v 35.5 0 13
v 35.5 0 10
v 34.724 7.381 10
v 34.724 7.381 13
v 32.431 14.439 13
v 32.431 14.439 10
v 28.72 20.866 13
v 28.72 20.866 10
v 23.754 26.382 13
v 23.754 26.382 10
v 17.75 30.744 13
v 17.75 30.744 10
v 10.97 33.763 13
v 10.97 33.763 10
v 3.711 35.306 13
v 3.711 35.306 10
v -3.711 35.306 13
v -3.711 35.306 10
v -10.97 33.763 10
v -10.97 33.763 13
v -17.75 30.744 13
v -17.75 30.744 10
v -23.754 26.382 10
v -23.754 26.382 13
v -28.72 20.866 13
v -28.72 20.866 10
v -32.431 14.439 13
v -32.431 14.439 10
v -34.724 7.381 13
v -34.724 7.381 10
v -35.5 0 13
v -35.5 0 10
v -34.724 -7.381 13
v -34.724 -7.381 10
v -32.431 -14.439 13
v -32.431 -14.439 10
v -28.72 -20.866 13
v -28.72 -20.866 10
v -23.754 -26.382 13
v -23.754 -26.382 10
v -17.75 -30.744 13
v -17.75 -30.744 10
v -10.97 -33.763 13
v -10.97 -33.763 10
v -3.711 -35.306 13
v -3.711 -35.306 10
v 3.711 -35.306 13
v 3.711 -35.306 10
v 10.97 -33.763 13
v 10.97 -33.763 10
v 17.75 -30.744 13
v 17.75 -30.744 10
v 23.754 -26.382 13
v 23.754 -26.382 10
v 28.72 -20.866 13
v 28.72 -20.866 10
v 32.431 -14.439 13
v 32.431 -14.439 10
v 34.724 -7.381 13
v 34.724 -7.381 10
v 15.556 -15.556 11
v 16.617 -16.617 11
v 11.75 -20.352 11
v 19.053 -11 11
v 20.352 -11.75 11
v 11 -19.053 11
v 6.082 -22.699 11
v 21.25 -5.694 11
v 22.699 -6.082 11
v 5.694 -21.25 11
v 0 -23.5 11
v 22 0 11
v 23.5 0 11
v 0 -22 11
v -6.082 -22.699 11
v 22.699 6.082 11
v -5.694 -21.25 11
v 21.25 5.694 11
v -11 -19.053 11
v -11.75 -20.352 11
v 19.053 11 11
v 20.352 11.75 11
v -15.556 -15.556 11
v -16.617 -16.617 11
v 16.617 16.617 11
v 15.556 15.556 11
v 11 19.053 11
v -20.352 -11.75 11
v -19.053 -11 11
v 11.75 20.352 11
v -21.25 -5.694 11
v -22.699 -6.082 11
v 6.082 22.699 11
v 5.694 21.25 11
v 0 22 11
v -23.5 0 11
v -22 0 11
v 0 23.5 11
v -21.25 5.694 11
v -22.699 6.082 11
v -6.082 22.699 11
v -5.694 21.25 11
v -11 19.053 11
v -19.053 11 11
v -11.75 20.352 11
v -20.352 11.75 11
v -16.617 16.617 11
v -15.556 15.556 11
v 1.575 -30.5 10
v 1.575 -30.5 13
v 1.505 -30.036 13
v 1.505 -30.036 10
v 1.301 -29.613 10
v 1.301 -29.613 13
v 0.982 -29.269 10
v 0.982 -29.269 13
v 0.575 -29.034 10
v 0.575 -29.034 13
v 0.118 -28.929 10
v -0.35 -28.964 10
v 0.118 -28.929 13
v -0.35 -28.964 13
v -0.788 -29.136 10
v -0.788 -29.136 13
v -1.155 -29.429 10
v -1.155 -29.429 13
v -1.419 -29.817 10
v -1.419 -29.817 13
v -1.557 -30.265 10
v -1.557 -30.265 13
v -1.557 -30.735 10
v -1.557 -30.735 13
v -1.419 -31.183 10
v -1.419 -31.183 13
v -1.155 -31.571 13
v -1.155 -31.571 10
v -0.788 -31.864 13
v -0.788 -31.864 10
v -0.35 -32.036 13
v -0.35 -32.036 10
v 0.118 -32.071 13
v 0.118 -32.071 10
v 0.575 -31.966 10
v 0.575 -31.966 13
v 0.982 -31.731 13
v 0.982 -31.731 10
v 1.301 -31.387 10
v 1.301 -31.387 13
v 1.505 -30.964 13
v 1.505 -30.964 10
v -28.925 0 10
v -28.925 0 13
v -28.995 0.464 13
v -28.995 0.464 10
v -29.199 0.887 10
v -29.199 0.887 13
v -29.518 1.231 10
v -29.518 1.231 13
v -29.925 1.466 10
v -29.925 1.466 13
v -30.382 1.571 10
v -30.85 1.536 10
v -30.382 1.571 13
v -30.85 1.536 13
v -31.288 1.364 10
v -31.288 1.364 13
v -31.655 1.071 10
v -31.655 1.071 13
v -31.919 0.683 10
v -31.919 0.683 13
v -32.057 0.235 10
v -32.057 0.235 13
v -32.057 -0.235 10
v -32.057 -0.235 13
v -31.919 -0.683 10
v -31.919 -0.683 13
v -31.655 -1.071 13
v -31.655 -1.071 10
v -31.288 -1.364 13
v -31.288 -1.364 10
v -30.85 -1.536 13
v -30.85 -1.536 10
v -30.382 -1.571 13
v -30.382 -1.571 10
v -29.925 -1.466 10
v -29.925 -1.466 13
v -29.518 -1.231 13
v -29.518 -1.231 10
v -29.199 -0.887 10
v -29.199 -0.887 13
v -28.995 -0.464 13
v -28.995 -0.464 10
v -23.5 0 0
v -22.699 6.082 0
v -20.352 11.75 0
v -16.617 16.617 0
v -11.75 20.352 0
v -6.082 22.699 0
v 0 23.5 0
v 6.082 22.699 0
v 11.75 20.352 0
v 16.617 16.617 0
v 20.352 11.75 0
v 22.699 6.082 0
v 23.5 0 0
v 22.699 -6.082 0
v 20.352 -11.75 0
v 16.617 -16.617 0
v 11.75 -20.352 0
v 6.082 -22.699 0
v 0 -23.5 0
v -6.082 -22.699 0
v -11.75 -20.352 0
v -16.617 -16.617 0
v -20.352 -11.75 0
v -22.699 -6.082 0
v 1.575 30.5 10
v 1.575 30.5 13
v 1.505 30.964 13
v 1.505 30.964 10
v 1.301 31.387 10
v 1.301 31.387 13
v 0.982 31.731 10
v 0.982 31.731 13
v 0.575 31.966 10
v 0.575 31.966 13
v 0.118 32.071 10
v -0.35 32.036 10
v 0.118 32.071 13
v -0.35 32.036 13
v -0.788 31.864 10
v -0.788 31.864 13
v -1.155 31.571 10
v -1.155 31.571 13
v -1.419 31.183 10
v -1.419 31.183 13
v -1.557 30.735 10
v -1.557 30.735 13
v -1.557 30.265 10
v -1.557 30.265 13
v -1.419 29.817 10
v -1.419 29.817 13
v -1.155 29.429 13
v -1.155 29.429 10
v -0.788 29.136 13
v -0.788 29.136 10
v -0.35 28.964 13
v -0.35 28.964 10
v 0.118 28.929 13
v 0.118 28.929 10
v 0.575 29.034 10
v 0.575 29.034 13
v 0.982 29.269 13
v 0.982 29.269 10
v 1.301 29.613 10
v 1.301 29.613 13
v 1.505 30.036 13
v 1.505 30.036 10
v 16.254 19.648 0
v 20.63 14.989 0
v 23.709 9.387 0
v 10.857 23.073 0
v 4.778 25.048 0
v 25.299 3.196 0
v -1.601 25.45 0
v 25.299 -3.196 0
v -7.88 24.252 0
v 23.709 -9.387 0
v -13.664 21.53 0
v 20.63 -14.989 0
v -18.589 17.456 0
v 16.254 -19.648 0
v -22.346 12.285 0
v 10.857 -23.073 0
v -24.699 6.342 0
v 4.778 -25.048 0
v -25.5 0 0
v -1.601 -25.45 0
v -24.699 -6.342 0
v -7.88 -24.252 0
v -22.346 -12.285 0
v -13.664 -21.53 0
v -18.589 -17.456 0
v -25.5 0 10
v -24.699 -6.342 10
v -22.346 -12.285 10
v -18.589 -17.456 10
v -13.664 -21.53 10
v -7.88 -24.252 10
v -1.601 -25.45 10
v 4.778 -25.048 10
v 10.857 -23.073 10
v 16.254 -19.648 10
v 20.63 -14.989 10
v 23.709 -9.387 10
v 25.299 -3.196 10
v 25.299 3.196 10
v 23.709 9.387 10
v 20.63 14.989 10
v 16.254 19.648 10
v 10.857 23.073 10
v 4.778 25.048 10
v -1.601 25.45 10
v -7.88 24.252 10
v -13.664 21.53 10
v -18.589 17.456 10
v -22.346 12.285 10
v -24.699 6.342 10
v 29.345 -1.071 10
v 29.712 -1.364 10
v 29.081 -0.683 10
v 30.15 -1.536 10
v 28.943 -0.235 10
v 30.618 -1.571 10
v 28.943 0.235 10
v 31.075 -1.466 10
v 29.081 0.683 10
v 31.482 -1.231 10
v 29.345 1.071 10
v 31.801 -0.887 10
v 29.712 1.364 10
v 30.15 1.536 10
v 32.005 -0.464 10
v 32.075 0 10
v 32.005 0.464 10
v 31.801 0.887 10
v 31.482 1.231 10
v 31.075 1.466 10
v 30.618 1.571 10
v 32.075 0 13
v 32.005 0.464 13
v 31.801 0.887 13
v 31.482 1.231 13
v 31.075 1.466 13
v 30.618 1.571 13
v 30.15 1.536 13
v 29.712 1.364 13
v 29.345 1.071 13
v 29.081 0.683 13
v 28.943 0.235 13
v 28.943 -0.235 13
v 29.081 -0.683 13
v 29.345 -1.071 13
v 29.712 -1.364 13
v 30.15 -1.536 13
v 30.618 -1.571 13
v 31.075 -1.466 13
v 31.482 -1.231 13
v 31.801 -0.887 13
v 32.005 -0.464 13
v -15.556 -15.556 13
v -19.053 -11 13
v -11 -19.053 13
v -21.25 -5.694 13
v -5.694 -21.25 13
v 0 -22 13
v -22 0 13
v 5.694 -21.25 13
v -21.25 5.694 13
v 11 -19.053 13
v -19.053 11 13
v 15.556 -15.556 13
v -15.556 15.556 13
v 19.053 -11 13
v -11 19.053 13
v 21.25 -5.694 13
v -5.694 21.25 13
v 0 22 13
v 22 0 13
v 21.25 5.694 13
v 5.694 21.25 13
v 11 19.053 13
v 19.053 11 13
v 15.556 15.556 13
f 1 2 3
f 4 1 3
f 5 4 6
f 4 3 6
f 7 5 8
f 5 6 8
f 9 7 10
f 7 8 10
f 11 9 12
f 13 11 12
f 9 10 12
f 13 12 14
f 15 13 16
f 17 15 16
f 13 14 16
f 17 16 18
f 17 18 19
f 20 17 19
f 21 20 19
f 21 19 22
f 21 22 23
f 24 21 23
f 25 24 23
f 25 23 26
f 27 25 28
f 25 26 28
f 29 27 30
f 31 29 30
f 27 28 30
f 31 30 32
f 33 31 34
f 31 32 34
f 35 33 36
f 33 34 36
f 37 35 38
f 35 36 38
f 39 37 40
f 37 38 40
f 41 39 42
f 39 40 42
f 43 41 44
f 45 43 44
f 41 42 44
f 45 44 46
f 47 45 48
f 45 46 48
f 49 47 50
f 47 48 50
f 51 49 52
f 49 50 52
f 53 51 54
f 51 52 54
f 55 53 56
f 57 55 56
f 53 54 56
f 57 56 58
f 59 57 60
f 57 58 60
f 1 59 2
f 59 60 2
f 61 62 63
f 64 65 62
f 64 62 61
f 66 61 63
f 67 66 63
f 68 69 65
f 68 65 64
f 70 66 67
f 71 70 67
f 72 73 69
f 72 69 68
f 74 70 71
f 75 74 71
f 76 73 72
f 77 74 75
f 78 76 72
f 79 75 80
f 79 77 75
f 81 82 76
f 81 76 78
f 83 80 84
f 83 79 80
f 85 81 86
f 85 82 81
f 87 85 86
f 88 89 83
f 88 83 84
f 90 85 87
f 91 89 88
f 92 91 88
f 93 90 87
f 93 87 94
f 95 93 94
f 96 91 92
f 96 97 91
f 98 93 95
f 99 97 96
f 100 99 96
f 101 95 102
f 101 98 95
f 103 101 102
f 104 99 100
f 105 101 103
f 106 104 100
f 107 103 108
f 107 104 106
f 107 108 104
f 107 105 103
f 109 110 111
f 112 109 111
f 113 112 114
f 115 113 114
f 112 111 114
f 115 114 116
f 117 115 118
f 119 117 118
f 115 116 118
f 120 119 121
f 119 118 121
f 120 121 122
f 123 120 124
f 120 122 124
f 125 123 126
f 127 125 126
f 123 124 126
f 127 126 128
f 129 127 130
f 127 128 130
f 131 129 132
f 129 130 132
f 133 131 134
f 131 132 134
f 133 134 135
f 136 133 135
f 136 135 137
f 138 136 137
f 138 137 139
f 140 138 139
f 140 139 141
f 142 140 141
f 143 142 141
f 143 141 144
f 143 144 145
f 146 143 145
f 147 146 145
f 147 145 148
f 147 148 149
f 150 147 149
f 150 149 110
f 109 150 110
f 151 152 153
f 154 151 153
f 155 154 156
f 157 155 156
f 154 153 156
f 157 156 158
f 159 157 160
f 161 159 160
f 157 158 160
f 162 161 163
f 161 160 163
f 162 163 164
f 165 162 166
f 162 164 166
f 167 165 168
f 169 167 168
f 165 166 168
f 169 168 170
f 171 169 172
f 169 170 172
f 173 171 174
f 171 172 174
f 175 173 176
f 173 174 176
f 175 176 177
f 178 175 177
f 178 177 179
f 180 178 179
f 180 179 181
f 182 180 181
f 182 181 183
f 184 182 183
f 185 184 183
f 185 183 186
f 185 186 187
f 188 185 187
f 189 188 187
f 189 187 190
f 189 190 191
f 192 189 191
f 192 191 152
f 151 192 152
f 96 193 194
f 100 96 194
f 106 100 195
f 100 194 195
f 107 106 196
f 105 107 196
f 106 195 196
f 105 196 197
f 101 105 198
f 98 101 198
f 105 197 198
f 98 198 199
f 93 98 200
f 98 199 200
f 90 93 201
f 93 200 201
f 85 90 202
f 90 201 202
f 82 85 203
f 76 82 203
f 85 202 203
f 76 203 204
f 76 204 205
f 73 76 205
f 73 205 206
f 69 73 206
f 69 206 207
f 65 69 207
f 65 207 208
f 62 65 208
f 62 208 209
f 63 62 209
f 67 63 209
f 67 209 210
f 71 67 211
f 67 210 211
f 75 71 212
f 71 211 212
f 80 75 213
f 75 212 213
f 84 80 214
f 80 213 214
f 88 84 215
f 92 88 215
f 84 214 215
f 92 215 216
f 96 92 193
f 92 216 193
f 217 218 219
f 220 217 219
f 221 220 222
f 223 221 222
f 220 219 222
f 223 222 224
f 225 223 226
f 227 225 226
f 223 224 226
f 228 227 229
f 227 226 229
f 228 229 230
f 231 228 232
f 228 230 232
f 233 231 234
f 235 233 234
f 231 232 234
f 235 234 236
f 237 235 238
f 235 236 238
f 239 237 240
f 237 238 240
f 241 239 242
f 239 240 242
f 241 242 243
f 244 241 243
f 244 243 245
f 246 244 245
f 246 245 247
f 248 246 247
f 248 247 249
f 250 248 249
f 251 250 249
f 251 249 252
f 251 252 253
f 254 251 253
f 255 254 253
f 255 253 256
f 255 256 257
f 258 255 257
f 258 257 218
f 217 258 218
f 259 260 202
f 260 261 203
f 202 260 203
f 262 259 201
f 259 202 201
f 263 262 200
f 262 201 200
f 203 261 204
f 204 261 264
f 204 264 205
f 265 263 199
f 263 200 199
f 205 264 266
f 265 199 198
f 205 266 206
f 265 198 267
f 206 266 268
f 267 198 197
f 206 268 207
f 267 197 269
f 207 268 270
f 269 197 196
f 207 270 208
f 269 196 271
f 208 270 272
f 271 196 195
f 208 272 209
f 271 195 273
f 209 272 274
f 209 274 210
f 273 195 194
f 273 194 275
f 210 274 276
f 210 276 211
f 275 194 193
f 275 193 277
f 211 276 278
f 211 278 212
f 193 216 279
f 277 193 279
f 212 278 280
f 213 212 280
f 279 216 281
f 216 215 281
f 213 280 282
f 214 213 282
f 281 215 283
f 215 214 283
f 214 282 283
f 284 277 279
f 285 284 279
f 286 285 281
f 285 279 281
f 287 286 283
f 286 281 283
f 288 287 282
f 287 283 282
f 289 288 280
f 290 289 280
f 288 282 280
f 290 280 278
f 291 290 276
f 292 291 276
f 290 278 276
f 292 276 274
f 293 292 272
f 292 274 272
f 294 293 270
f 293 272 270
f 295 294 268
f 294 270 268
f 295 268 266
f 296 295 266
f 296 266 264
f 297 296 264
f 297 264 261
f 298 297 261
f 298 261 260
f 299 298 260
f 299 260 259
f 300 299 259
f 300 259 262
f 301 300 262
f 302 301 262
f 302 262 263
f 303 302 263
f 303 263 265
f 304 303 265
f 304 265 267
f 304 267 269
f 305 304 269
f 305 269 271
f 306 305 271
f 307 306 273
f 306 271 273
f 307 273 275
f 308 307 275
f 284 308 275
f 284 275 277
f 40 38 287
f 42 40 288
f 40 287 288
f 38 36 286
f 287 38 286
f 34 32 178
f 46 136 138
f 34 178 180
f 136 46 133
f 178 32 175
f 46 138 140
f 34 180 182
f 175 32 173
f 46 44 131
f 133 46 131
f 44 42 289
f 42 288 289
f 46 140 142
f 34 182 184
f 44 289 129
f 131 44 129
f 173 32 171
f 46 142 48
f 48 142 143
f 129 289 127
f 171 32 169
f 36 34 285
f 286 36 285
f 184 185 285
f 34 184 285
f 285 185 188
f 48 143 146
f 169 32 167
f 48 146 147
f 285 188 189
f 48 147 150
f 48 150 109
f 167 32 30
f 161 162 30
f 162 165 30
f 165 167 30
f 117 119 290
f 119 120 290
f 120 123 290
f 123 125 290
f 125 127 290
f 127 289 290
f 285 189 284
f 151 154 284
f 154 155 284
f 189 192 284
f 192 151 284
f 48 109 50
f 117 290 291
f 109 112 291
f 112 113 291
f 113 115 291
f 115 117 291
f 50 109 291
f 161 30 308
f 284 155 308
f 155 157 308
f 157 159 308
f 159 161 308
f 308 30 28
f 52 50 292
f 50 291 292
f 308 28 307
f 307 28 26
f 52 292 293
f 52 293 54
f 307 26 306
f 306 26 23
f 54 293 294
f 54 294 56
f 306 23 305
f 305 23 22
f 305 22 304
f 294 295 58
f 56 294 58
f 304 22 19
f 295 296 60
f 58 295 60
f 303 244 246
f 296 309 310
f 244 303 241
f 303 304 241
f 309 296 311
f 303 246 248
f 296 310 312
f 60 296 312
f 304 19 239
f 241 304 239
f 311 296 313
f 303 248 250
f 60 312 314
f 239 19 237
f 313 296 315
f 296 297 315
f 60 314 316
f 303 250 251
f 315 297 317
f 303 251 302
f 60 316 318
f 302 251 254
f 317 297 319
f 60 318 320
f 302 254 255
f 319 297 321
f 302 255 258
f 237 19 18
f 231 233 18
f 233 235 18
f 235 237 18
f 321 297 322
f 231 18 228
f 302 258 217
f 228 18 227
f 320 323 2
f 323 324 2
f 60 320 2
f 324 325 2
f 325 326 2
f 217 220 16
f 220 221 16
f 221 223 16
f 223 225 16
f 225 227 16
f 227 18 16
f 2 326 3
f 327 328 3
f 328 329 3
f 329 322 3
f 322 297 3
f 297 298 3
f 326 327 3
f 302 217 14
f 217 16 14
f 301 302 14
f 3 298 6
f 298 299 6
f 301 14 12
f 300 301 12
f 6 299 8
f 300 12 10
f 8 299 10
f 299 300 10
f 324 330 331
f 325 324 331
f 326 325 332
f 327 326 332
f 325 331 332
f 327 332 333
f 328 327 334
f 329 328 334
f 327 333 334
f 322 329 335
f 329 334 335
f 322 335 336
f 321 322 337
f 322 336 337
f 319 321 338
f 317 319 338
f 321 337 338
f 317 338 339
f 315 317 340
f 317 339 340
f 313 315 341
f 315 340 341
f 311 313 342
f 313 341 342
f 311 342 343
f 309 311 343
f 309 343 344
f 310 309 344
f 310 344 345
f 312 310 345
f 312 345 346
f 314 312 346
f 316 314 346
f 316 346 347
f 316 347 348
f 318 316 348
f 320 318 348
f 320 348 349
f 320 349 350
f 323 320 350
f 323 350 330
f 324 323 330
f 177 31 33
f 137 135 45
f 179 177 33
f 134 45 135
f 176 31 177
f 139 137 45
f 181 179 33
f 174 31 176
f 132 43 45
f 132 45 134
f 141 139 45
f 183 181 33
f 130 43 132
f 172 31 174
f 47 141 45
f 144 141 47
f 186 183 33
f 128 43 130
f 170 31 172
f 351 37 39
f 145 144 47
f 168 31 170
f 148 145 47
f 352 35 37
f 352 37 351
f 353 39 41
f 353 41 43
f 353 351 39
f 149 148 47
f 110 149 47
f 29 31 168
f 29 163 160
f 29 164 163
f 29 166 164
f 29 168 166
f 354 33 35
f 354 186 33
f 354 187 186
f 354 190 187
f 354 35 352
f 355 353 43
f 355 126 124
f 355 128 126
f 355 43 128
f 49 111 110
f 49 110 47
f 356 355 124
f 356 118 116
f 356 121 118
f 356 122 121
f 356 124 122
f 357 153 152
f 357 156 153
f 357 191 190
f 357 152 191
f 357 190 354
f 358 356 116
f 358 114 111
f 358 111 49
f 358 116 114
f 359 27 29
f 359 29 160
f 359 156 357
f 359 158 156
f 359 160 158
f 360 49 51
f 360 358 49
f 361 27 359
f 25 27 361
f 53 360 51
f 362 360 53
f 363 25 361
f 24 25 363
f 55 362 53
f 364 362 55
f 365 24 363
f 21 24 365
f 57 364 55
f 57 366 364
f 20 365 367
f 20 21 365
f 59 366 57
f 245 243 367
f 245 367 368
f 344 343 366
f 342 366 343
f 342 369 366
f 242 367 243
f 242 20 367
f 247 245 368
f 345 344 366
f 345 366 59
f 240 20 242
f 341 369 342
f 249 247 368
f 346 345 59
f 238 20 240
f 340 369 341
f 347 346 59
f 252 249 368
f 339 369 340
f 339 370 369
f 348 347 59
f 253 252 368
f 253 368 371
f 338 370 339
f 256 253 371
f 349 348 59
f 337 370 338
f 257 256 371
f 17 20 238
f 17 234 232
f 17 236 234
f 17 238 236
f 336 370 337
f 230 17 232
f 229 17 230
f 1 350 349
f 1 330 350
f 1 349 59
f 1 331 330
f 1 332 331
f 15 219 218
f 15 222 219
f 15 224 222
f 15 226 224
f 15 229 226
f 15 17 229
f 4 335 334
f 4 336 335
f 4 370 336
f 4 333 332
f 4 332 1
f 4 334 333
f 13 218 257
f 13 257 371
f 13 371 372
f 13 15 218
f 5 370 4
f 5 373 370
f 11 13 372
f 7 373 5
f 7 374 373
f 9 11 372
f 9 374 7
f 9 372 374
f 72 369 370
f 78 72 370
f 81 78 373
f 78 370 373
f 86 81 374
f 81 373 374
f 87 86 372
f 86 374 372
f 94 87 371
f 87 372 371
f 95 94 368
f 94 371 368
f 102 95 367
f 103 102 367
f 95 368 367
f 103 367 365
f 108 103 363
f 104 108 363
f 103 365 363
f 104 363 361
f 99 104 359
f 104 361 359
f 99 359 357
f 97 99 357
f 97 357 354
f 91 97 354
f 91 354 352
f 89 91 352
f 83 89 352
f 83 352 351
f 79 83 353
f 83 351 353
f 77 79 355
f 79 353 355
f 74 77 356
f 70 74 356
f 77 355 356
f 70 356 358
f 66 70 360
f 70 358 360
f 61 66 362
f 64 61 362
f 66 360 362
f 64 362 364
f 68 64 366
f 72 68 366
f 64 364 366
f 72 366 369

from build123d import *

# Parameters (mm, degrees)
SKETCH_1_R          = 25.5
EXTRUDE_1_DEPTH     = 13
SKETCH_2_R          = 23.5
CUT_EXTRUDE_1_DEPTH = 11
SKETCH_3_R          = 22
CUT_EXTRUDE_2_DEPTH = 2
EXTRUDE_START       = -3
SKETCH_4_R          = 35.5
SKETCH_4_R_2        = 25.5
EXTRUDE_2_DEPTH     = 3
SKETCH_5_R          = 1.575
CUT_EXTRUDE_3_DEPTH = 52.860389509


with BuildPart() as part:
    # 草图1 → 凸台-拉伸1 (new body)
    with BuildSketch(Plane.XY):
        with Locations(Location((0, 0, 0), (0, 0, 180))):
            Circle(SKETCH_1_R)
    extrude(amount=EXTRUDE_1_DEPTH)

    # 草图2 → 切除-拉伸1 (cut)
    with BuildSketch(Plane(origin=(0, 0, 0), x_dir=(-1, 0, 0), z_dir=(0, 0, -1))):
        Circle(SKETCH_2_R)
    extrude(amount=-CUT_EXTRUDE_1_DEPTH, mode=Mode.SUBTRACT)

    # 草图3 → 切除-拉伸2 (cut)
    with BuildSketch(Plane.XY.offset(13)):
        Circle(SKETCH_3_R)
    extrude(amount=-CUT_EXTRUDE_2_DEPTH, mode=Mode.SUBTRACT)

    # 草图4 → 凸台-拉伸2 (add)
    with BuildSketch(Plane.XY.offset(13).offset(EXTRUDE_START)):
        Circle(SKETCH_4_R)
        with Locations(Location((0, 0, 0), (0, 0, 180))):
            Circle(SKETCH_4_R_2, mode=Mode.SUBTRACT)
    extrude(amount=EXTRUDE_2_DEPTH)

    # 草图5 → 切除-拉伸3 (cut, through all)
    with BuildSketch(Plane.XY.offset(13)):
        with Locations((0, 30.5)):
            Circle(SKETCH_5_R)
        with Locations((30.5, 0)):
            Circle(SKETCH_5_R)
        with Locations((0, -30.5)):
            Circle(SKETCH_5_R)
        with Locations((-30.5, 0)):
            Circle(SKETCH_5_R)
    extrude(amount=-CUT_EXTRUDE_3_DEPTH, mode=Mode.SUBTRACT)


solid = part.part
